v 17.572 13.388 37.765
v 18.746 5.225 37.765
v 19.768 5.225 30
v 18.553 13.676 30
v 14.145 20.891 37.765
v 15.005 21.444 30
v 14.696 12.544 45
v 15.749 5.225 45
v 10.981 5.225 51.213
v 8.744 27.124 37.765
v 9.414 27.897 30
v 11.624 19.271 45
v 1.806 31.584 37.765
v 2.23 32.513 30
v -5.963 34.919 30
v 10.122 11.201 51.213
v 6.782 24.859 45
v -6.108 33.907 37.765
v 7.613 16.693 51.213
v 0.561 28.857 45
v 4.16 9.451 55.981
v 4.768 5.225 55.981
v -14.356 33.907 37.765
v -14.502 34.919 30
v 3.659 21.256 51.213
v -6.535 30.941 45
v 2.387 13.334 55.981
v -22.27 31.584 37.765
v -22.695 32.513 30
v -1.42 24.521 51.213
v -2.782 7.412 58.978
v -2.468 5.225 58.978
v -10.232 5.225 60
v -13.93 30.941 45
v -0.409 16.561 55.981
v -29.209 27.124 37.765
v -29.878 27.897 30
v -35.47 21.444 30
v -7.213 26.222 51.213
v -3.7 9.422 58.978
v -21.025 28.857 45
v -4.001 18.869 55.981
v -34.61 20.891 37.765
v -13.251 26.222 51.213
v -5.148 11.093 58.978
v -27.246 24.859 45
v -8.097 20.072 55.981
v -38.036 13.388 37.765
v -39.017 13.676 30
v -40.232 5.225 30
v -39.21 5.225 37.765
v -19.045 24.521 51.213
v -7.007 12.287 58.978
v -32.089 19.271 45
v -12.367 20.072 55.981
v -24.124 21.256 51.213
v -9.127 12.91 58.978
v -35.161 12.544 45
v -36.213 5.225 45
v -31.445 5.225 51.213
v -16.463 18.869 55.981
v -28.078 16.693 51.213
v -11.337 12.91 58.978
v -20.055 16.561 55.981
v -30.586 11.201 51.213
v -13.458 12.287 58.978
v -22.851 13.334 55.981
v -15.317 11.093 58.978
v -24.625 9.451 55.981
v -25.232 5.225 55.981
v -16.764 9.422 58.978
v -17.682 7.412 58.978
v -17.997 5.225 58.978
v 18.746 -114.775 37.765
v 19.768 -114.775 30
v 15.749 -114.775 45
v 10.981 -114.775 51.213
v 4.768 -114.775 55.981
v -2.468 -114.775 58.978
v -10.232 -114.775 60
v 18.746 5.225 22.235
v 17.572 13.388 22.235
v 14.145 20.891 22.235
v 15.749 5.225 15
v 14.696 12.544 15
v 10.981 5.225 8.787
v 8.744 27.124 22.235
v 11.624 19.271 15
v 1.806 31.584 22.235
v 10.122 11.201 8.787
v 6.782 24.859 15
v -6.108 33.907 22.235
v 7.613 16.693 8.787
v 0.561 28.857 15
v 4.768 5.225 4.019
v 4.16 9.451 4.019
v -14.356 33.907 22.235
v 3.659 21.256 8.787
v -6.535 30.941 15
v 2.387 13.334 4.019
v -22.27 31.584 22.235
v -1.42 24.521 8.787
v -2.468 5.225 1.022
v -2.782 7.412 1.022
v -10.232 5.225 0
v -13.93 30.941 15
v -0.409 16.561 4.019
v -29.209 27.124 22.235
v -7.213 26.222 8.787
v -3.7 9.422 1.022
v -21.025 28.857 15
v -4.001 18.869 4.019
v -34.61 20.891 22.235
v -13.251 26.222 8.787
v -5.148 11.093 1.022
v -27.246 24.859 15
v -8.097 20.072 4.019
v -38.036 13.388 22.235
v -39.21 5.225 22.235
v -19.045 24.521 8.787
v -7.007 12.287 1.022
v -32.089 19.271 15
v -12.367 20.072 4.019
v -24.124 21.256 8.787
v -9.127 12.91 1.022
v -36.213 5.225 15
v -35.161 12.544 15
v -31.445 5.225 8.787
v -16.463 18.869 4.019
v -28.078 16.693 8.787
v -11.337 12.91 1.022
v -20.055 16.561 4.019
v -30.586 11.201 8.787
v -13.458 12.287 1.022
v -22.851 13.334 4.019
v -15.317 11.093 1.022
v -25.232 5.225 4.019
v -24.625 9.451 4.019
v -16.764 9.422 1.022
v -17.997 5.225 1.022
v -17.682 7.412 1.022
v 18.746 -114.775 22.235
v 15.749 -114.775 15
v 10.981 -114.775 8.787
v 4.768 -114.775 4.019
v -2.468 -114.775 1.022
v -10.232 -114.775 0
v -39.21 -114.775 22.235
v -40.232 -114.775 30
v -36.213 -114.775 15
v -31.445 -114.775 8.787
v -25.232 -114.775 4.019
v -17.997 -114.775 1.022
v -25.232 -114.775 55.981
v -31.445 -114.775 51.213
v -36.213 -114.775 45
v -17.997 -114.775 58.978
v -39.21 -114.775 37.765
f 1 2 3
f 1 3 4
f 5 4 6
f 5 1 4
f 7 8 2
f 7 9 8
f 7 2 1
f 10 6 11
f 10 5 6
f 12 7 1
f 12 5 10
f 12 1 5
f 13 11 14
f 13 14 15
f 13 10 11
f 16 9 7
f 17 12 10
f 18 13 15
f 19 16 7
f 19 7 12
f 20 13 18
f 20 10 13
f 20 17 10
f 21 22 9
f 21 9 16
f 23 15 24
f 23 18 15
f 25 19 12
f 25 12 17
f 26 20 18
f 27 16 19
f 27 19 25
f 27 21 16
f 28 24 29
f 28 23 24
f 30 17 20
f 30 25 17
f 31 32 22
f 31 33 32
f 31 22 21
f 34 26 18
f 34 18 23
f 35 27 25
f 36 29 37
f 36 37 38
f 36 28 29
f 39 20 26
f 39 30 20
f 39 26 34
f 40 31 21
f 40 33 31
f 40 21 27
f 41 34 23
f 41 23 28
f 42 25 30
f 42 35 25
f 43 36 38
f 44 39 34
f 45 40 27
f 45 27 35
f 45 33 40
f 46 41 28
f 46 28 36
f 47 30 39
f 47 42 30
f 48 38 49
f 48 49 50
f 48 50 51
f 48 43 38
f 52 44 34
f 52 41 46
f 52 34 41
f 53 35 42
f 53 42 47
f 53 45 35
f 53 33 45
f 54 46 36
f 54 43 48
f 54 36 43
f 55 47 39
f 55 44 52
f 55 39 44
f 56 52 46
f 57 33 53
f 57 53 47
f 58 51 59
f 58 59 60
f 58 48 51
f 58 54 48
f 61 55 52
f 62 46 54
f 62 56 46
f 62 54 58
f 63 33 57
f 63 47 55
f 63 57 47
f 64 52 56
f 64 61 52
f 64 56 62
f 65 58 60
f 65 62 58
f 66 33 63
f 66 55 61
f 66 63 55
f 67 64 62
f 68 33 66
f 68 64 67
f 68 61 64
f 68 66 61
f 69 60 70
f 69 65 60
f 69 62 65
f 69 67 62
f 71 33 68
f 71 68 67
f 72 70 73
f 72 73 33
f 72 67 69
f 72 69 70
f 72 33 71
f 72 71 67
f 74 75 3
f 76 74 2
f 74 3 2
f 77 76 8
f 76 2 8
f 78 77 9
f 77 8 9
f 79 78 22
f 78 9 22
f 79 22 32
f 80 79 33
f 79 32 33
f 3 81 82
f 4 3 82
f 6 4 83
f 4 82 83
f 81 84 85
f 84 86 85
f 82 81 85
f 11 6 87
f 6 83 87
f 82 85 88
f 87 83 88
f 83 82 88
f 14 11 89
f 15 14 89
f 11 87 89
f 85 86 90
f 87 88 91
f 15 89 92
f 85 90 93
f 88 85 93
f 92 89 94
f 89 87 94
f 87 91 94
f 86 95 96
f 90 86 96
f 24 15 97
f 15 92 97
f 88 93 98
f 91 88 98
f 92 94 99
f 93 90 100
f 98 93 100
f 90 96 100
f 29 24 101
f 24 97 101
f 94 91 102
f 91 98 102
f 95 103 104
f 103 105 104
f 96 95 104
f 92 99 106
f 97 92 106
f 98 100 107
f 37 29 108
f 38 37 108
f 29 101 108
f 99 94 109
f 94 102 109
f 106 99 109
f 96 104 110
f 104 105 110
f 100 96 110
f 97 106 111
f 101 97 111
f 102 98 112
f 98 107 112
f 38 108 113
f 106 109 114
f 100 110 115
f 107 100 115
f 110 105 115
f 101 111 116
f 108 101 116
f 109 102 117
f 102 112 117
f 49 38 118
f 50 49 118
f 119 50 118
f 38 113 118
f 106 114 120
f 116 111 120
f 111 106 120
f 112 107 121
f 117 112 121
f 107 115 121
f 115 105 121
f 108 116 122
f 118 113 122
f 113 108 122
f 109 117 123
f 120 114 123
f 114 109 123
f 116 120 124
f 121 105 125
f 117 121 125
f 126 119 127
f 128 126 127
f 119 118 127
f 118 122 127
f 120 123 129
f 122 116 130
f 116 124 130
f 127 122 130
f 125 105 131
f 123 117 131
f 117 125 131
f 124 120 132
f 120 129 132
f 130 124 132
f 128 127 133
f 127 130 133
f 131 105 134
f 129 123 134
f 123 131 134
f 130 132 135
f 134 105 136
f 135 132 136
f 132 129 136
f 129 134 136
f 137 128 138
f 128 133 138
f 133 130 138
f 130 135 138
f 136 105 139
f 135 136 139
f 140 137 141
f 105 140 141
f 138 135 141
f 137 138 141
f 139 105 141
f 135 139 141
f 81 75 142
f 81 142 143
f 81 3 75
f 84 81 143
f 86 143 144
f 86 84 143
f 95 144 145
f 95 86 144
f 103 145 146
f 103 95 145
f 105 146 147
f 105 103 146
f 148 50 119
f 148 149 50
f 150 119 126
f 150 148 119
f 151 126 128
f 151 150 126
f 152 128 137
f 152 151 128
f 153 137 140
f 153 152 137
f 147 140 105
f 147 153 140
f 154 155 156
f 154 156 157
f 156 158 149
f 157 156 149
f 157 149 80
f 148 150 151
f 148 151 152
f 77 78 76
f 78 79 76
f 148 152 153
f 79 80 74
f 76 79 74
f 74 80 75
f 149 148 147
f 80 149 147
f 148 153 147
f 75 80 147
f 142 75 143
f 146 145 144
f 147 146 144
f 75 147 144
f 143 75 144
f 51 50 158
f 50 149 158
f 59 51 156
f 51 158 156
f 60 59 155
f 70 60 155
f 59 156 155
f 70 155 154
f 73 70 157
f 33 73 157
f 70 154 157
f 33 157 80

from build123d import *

# Parameters (mm, degrees)
F1_DEPTH = 60
F2_R     = 29.99999


# Not quite as in the source:
# - a fillet or chamfer is up to 0.001 mm smaller than in the source, because OpenCascade refuses the exact size


with BuildPart() as f1:
    # F0 (on Top) → F1 (new body)
    with BuildSketch(Plane.XY):
        with BuildLine():
            ThreePointArc((-10.2322225652, 35.2245123306), (-31.4454260008, 26.4377157662), (-40.2322225652, 5.2245123306))
            Line((-40.2322225652, 5.2245123306), (-40.2322225652, -114.7754876694))
            Line((-40.2322225652, -114.7754876694), (19.7677774348, -114.7754876694))
            Line((19.7677774348, -114.7754876694), (19.7677774348, 5.2245123306))
            ThreePointArc((19.7677774348, 5.2245123306), (10.9809808704, 26.4377157662), (-10.2322225652, 35.2245123306))
        make_face()
    extrude(amount=F1_DEPTH)

    # F2 (radius 30 in the source; OpenCascade refuses exactly that, so slightly less here)
    f2_edges = [f1.edges().sort_by_distance(p)[0] for p in [
        (-40.232223, -54.775488, 0),
        (-40.232223, -54.775488, 60),
    ]]
    fillet(f2_edges, radius=F2_R)


solid = f1.part
